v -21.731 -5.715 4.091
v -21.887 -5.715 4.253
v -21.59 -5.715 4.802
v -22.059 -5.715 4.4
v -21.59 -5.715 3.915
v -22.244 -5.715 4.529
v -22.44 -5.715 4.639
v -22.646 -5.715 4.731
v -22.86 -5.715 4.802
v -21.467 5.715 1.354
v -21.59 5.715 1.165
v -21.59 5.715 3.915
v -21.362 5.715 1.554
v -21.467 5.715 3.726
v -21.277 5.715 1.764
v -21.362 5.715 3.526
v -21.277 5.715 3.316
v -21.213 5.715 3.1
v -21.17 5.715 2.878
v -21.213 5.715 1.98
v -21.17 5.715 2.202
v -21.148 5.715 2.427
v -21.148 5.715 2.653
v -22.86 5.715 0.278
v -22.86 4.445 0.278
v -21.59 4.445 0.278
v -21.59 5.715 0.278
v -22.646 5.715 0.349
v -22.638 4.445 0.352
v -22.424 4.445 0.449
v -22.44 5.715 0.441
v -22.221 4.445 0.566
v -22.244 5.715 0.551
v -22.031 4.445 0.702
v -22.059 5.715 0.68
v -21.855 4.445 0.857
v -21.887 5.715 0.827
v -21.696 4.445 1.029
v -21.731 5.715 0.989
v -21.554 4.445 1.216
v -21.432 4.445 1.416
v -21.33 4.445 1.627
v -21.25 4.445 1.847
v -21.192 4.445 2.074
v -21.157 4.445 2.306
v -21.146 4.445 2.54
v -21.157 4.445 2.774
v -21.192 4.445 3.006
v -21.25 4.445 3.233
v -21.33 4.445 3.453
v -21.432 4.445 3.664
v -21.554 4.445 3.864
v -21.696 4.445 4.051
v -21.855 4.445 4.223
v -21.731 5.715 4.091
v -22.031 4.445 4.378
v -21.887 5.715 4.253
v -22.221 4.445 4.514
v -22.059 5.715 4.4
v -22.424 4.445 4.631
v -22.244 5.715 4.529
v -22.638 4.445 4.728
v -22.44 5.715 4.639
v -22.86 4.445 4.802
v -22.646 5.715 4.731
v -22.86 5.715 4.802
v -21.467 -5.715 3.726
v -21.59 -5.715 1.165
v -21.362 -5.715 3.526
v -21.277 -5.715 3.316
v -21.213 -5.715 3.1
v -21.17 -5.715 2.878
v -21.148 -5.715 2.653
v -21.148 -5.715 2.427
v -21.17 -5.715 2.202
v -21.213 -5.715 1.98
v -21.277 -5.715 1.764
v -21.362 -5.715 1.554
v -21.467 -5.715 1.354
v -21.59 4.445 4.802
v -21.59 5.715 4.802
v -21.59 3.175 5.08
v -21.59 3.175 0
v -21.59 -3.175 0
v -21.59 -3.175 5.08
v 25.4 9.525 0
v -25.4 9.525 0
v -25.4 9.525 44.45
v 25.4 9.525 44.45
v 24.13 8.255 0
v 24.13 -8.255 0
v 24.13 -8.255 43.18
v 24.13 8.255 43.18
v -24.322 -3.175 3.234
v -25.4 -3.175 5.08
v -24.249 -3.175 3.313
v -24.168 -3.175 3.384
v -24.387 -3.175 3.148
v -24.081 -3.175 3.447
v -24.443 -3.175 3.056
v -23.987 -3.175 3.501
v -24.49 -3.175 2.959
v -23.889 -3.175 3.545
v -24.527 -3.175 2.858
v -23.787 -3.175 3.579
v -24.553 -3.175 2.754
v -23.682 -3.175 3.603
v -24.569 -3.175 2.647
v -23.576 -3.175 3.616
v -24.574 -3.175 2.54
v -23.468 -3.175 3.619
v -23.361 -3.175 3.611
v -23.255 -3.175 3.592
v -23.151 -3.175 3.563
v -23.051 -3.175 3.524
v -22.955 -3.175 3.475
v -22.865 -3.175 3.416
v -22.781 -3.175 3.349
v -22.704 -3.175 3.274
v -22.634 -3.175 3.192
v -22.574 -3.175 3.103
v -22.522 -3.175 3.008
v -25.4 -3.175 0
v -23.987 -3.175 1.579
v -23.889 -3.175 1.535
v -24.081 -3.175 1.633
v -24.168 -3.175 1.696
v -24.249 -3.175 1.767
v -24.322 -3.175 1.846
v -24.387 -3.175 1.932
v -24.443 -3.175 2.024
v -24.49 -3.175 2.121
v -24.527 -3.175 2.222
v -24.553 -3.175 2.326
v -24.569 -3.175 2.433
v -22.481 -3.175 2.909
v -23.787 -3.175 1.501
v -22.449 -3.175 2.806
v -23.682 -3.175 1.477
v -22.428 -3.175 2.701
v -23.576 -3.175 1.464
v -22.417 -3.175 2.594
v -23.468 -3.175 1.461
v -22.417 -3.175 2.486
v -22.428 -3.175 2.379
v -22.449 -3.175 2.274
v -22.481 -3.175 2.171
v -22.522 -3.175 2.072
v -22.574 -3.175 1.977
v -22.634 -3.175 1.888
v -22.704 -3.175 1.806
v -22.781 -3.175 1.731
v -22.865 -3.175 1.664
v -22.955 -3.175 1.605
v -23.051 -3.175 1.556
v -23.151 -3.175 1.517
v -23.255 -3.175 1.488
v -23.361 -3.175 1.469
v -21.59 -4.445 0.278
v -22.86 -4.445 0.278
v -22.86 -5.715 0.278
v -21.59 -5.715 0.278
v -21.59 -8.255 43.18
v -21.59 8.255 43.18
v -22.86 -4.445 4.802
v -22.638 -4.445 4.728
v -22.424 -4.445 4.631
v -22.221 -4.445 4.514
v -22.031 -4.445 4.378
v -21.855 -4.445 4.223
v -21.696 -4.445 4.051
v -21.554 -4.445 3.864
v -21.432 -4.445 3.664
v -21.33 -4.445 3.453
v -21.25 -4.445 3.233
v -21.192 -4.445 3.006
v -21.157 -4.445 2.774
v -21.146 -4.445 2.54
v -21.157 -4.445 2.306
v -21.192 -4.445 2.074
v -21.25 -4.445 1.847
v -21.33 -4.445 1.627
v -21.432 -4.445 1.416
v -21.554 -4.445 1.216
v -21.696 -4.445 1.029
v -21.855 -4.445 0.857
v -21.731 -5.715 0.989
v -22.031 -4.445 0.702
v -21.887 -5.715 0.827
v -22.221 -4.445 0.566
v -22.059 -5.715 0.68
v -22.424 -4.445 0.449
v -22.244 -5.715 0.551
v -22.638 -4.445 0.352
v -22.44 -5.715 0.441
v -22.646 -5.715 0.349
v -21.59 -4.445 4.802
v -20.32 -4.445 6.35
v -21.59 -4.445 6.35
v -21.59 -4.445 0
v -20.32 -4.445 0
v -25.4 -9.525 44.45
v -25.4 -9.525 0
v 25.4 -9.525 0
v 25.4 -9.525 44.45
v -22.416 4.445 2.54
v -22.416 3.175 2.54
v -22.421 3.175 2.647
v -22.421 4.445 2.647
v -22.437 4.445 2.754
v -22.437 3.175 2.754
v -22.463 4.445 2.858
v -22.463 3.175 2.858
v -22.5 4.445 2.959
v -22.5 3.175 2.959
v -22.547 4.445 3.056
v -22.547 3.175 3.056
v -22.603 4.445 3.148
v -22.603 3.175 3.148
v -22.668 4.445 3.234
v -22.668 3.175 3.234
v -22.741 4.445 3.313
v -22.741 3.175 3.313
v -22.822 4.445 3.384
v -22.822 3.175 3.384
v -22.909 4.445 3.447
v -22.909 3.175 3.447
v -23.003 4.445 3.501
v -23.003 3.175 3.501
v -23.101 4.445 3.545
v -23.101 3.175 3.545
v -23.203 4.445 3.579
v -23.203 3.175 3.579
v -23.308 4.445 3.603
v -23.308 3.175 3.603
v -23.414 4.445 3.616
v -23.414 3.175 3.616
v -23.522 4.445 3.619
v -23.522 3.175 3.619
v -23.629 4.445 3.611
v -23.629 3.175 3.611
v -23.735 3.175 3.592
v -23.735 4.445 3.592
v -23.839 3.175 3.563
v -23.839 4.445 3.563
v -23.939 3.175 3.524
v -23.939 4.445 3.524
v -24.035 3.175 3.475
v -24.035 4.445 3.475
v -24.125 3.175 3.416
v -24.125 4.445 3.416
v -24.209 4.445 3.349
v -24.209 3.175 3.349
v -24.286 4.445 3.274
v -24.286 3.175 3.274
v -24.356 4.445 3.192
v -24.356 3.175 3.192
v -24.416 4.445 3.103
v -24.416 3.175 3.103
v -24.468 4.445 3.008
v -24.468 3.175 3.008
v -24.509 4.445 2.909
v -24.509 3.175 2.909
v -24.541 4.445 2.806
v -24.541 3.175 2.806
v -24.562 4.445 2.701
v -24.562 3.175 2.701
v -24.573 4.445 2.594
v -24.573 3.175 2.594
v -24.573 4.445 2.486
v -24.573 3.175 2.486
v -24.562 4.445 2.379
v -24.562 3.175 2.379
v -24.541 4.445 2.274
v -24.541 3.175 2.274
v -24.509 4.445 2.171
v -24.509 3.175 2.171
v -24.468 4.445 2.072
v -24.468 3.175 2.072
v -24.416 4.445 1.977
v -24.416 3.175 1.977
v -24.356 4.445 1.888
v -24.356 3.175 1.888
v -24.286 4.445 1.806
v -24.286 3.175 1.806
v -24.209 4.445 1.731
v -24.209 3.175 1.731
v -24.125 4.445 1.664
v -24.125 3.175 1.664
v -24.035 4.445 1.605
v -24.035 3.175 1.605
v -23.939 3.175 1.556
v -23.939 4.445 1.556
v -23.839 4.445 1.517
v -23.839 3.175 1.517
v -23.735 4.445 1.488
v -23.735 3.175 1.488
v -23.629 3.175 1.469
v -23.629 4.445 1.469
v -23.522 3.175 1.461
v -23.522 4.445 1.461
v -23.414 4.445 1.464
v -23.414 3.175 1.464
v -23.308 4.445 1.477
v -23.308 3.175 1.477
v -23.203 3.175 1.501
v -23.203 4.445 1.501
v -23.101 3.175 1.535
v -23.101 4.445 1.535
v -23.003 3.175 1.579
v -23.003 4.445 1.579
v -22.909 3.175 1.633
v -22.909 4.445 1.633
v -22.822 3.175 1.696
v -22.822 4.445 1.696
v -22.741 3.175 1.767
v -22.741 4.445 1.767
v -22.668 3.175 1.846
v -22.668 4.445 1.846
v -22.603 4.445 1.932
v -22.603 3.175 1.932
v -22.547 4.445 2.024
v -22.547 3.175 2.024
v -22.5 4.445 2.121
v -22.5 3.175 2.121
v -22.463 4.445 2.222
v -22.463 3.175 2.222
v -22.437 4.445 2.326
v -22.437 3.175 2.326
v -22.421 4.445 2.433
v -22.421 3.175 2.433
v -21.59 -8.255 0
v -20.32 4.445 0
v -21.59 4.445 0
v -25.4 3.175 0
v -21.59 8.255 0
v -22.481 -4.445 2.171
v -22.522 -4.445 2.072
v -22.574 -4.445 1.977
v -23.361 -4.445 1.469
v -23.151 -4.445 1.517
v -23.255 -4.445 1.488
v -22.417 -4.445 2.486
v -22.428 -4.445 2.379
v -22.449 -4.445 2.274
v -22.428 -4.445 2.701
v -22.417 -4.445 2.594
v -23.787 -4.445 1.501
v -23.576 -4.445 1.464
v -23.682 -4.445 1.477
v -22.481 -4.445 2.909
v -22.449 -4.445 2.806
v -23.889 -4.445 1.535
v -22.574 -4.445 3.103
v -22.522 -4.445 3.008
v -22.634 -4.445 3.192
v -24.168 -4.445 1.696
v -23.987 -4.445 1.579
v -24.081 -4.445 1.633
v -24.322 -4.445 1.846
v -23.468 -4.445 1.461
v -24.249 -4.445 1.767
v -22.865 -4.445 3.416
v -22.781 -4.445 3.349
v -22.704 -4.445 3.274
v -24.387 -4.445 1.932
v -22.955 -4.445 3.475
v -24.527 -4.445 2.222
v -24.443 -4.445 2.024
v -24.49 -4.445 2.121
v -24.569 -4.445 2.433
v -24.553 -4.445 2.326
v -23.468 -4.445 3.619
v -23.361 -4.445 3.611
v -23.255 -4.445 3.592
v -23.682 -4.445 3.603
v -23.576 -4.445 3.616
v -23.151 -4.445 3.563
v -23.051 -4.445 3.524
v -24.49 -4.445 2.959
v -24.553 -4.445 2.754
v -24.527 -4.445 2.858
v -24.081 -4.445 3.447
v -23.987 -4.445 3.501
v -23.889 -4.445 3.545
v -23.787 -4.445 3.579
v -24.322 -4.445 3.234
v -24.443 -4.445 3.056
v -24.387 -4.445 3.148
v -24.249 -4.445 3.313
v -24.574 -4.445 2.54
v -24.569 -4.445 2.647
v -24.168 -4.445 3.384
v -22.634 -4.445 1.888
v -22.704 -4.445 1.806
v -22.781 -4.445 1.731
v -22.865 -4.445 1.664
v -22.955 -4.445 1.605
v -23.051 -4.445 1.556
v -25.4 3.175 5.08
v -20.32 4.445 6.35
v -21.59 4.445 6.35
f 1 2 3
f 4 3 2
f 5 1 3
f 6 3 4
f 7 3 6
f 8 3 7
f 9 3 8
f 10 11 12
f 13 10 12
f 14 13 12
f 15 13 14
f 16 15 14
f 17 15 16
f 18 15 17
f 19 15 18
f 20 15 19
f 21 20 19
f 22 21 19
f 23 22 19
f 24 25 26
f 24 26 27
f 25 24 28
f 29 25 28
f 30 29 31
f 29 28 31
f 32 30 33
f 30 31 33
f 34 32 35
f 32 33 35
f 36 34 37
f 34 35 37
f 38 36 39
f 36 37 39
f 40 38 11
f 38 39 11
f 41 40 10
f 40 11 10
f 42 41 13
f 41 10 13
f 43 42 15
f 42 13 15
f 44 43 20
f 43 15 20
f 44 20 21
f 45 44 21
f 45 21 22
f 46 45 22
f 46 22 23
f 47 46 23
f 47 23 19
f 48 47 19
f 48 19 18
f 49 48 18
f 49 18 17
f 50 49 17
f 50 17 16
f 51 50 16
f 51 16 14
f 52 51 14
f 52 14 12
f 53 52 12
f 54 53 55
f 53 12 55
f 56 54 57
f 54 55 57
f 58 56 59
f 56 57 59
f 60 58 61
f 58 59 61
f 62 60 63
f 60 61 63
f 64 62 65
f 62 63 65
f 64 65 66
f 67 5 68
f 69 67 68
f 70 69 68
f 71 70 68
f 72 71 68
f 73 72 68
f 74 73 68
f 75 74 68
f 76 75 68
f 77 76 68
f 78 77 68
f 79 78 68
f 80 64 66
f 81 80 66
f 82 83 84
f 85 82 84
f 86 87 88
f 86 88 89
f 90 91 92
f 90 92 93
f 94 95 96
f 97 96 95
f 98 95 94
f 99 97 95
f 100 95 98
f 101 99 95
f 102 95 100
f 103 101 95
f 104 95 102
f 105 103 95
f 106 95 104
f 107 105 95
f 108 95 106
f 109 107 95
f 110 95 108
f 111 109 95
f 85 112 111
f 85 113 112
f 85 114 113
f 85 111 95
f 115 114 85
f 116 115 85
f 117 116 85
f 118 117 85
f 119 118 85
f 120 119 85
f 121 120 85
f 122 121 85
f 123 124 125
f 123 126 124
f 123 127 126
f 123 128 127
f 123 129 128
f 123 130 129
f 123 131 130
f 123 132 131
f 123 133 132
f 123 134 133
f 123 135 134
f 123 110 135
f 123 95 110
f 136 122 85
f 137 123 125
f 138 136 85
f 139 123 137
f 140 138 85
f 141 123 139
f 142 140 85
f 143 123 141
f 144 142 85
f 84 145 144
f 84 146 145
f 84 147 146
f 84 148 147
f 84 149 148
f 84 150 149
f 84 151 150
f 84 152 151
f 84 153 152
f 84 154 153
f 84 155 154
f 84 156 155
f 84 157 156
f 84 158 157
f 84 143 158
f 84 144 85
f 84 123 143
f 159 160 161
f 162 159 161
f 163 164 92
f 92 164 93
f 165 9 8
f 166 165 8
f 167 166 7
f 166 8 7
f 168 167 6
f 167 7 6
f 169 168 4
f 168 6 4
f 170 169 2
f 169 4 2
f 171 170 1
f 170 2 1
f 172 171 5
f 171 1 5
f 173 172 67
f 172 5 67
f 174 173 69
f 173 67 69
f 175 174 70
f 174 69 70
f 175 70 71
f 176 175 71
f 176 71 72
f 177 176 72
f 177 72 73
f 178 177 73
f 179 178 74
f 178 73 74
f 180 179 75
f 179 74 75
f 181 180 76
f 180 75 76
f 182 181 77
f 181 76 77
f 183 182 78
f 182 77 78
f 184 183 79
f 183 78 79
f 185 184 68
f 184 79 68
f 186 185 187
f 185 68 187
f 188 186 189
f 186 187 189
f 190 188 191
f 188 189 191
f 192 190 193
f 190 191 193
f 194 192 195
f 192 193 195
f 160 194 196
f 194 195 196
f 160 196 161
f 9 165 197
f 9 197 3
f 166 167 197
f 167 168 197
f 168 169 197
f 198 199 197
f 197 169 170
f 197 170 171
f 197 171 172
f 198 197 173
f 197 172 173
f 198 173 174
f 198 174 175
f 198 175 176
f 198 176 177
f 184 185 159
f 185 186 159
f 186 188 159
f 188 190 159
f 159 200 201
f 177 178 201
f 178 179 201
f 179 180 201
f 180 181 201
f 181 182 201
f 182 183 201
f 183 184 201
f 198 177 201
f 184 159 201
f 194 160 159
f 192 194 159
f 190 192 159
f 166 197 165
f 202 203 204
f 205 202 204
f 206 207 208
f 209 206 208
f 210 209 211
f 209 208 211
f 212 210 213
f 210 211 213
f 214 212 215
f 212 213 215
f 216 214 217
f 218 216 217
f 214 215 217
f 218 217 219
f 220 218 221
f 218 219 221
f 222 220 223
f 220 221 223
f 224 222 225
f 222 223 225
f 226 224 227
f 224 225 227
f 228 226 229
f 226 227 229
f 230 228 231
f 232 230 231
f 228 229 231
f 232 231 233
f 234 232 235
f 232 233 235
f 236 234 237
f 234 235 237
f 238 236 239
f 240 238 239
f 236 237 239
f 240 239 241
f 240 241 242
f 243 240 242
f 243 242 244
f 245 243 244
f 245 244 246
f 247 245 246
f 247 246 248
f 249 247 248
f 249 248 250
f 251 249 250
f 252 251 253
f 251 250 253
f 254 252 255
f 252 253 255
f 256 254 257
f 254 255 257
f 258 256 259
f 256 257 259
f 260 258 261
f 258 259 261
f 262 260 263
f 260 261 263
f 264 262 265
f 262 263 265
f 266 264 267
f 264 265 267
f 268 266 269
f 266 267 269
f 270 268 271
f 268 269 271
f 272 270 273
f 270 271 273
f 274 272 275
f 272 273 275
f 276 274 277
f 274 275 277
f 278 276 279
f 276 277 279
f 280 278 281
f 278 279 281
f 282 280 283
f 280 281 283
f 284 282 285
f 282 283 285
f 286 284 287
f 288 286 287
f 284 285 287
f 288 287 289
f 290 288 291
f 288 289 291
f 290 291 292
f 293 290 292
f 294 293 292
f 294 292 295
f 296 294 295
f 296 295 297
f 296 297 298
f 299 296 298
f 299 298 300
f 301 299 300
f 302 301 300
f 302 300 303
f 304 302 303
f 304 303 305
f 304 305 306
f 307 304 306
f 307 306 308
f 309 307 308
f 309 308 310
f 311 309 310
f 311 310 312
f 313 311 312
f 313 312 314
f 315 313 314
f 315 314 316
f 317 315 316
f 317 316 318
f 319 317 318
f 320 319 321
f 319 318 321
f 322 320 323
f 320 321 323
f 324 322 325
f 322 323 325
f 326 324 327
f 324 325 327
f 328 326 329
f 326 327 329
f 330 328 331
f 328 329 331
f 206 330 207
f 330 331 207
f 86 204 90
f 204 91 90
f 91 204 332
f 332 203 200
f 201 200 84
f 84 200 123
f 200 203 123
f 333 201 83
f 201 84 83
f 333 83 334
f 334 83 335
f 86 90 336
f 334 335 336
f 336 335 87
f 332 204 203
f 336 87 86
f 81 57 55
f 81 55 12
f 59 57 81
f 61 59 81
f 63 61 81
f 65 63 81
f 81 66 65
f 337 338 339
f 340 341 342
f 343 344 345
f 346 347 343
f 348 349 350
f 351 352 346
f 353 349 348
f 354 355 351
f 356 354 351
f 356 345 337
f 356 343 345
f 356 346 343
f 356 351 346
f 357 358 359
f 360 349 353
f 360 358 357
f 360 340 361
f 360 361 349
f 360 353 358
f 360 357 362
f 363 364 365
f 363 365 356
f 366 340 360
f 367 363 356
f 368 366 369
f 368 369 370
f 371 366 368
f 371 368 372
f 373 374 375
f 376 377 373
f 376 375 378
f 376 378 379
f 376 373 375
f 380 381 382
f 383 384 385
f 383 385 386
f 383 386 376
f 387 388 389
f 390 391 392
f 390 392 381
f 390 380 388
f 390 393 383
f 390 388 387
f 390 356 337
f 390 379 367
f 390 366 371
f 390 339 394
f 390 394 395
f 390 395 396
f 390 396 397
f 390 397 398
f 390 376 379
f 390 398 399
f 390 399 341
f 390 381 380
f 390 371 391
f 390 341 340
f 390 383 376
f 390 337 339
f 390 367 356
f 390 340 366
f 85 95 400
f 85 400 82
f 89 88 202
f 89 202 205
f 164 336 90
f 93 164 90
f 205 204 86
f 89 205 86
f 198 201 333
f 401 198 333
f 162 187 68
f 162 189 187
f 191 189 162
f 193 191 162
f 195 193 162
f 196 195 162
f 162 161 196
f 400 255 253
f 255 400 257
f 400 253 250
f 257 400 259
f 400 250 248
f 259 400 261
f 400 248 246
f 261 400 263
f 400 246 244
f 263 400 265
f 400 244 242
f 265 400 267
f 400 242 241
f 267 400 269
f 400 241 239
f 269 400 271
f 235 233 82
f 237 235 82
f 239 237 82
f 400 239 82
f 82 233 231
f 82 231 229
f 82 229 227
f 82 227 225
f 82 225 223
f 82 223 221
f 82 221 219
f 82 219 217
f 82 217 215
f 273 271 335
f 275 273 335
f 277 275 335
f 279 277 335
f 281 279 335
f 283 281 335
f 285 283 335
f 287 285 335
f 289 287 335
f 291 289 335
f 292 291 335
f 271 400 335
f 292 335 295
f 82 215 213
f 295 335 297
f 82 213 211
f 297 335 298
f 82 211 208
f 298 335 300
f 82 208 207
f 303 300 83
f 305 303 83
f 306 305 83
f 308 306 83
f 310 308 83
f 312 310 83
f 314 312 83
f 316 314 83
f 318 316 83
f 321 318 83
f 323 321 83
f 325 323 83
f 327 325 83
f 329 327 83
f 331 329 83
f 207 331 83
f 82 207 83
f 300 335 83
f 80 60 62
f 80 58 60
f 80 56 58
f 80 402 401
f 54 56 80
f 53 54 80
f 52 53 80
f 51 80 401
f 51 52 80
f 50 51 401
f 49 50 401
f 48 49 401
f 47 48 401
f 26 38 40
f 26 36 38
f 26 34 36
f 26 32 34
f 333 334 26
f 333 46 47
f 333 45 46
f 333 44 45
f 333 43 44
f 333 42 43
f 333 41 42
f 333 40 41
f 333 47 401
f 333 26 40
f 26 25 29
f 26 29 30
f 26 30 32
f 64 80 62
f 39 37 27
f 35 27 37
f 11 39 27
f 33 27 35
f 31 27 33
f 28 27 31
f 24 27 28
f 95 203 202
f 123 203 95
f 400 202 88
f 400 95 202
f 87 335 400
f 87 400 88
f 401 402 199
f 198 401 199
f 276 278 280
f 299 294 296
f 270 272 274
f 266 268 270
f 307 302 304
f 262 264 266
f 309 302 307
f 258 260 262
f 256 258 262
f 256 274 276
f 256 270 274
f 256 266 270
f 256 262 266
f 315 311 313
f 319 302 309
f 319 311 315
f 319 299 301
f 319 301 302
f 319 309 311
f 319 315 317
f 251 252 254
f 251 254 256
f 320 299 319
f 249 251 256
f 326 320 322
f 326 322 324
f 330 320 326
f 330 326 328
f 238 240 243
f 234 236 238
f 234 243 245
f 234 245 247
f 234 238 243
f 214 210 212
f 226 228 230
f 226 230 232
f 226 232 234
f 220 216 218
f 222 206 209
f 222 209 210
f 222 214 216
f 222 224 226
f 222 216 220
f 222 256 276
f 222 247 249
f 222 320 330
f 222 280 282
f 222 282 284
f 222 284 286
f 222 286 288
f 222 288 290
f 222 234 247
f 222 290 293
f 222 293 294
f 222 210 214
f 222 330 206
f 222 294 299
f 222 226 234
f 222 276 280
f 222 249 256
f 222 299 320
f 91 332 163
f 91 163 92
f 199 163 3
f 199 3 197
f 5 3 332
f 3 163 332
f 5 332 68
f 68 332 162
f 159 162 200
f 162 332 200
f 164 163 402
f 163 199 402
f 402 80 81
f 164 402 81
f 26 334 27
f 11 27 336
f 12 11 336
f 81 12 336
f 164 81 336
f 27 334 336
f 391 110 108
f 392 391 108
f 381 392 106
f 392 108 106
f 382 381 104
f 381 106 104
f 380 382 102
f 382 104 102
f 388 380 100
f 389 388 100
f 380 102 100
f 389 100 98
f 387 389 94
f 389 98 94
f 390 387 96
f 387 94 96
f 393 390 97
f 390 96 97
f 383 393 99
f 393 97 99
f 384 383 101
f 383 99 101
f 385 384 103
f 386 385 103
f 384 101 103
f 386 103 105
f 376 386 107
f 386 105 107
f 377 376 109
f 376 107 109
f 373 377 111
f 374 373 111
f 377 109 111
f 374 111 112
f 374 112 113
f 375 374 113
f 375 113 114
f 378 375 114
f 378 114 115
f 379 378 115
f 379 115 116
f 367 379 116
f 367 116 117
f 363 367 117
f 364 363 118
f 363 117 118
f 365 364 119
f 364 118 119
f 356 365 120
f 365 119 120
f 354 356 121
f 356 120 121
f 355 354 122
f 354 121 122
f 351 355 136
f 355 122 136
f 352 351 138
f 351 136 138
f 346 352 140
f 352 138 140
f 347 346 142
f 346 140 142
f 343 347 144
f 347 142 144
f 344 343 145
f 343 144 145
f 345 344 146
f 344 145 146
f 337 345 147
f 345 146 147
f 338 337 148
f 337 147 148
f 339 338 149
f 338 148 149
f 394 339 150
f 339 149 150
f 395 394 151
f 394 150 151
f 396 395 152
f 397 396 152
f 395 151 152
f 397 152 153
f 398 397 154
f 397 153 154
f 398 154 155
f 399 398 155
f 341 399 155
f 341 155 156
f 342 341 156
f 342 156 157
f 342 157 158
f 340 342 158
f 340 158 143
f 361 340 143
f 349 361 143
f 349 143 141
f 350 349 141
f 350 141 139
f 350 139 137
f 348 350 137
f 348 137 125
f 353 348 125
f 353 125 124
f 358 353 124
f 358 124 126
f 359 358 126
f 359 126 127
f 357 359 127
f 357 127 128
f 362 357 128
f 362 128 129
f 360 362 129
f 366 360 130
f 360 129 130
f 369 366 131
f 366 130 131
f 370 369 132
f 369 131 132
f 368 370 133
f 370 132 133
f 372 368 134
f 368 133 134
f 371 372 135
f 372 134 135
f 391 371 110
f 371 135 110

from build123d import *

# Parameters (mm, degrees)
F0_W        = 50.8
F0_H        = 19.05
F1_DEPTH    = 44.45
F2_W        = 3.81
F2_H        = 6.35
F3_DEPTH    = 5.08
F4_R        = 1.0795
F5_DEPTH    = 1.27
F6_R        = 1.0795
F7_DEPTH    = 1.27
F8_T        = 1.27
F8_T3_DEPTH = 6.35
F8_T5_DEPTH = 7.62
F8_T7_DEPTH = 8.89
F9_DEPTH    = 2.54


# Not quite as in the source:
# - a shell that OpenCascade refuses in one call is made with other operations: the cavity is built on its own and cut out


with BuildPart() as f1:
    # F0 (on Top) → F1 (new body)
    with BuildSketch(Plane.XY):
        Rectangle(F0_W, F0_H)
    extrude(amount=F1_DEPTH)

    # F2 (on face) → F3 (cut)
    with BuildSketch(Plane(origin=(0, 0, 0), x_dir=(1, 0, 0), z_dir=(0, 0, -1))):
        with Locations((-23.495, 0)):
            Rectangle(F2_W, F2_H)
    extrude(amount=-F3_DEPTH, mode=Mode.SUBTRACT)

    # F4 (on face) → F5 (cut)
    with BuildSketch(Plane.XZ.offset(-3.175)):
        with Locations((-23.495, 2.54)):
            Circle(F4_R)
    extrude(amount=-F5_DEPTH, mode=Mode.SUBTRACT)

    # F6 (on face) → F7 (cut)
    with BuildSketch(Plane(origin=(0, -3.175, 0), x_dir=(-1, 0, 0), z_dir=(0, 1, 0))):
        with Locations((23.495, 2.54)):
            Circle(F6_R)
    extrude(amount=-F7_DEPTH, mode=Mode.SUBTRACT)

    # F8: shell of thickness 1.27, made by hand


with BuildPart() as f8_core1:
    # F8_t2: copy of F1
    add(f1.part)

    # the walls: a layer under each face that stays
    f8_faces = [f8_core1.faces().sort_by_distance(p)[0] for p in [
        (0, -9.525, 22.225),
        (-25.4, 0, 22.225),
        (25.4, 0, 22.225),
        (0, 0, 44.45),
        (-24.765, 3.175, 4.2333333333),
        (-23.495, 0, 5.08),
        (-22.225, -3.175, 4.2333333333),
        (0, 9.525, 22.225),
        (-21.59, 0, 2.54),
        (-24.5745, 3.81, 2.54),
        (-22.4155, -3.81, 2.54),
        (-23.495, 4.445, 2.54),
        (-23.495, -4.445, 2.54),
    ]]
    thicken(f8_faces, amount=-F8_T, mode=Mode.SUBTRACT)

    # F8_s4 → F8_t3 (cut)
    with BuildSketch(Plane.YZ.offset(-26.67)):
        Polygon((3.1623, 5.0673), (4.445, 5.08), (4.445, 6.35), (3.175, 6.35), align=None)
        Polygon((-3.1623, 5.0673), (-3.175, 6.35), (-4.445, 6.35), (-4.445, 5.08), align=None)
    extrude(amount=F8_T3_DEPTH, mode=Mode.SUBTRACT)

    # F8_s6 → F8_t5 (cut)
    with BuildSketch(Plane.XY.offset(-1.27)):
        Polygon((-21.6027, 3.1623), (-21.59, 4.445), (-20.32, 4.445), (-20.32, 3.175), align=None)
        Polygon((-21.6027, -3.1623), (-21.59, -4.445), (-20.32, -4.445), (-20.32, -3.175), align=None)
    extrude(amount=F8_T5_DEPTH, mode=Mode.SUBTRACT)

    # F8_s8 → F8_t7 (cut)
    with BuildSketch(Plane.XZ.offset(-4.445)):
        Polygon((-21.6027, 5.0673), (-21.59, 6.35), (-20.32, 6.35), (-20.32, 5.08), align=None)
    extrude(amount=F8_T7_DEPTH, mode=Mode.SUBTRACT)

    # F8_s9 → F8_t10 (revolve, cut)
    with BuildSketch(Plane.XY.offset(2.54)):
        Polygon((-22.4282, 4.4323), (-21.1455, 4.445), (-21.1455, 5.715), (-22.4155, 5.715), align=None)
    revolve(axis=Axis((-23.495, 4.445, 2.54), (0, -1, 0)), mode=Mode.SUBTRACT)

    # F8_s11 → F8_t12 (revolve, cut)
    with BuildSketch(Plane.XY.offset(2.54)):
        Polygon((-24.5618, -4.4323), (-25.8445, -4.445), (-25.8445, -5.715), (-24.5745, -5.715), align=None)
    revolve(axis=Axis((-23.495, -4.445, 2.54), (0, 1, 0)), mode=Mode.SUBTRACT)


with BuildPart() as f1_1:
    add(f1.part)

    # what is left inside the walls is the cavity
    f8_cavity = [f8_core1.part.solids().sort_by_distance(p)[0] for p in [
        (0, -8.2423, 28.786667),
    ]]
    add(f8_cavity, mode=Mode.SUBTRACT)

    # F9 (add): a face of the model
    f9_faces = [f1_1.faces().sort_by_distance(p)[0] for p in [
        (-24.13, 0, 23.5412296588),
    ]]
    extrude(f9_faces, amount=F9_DEPTH)


solid = f1_1.part
